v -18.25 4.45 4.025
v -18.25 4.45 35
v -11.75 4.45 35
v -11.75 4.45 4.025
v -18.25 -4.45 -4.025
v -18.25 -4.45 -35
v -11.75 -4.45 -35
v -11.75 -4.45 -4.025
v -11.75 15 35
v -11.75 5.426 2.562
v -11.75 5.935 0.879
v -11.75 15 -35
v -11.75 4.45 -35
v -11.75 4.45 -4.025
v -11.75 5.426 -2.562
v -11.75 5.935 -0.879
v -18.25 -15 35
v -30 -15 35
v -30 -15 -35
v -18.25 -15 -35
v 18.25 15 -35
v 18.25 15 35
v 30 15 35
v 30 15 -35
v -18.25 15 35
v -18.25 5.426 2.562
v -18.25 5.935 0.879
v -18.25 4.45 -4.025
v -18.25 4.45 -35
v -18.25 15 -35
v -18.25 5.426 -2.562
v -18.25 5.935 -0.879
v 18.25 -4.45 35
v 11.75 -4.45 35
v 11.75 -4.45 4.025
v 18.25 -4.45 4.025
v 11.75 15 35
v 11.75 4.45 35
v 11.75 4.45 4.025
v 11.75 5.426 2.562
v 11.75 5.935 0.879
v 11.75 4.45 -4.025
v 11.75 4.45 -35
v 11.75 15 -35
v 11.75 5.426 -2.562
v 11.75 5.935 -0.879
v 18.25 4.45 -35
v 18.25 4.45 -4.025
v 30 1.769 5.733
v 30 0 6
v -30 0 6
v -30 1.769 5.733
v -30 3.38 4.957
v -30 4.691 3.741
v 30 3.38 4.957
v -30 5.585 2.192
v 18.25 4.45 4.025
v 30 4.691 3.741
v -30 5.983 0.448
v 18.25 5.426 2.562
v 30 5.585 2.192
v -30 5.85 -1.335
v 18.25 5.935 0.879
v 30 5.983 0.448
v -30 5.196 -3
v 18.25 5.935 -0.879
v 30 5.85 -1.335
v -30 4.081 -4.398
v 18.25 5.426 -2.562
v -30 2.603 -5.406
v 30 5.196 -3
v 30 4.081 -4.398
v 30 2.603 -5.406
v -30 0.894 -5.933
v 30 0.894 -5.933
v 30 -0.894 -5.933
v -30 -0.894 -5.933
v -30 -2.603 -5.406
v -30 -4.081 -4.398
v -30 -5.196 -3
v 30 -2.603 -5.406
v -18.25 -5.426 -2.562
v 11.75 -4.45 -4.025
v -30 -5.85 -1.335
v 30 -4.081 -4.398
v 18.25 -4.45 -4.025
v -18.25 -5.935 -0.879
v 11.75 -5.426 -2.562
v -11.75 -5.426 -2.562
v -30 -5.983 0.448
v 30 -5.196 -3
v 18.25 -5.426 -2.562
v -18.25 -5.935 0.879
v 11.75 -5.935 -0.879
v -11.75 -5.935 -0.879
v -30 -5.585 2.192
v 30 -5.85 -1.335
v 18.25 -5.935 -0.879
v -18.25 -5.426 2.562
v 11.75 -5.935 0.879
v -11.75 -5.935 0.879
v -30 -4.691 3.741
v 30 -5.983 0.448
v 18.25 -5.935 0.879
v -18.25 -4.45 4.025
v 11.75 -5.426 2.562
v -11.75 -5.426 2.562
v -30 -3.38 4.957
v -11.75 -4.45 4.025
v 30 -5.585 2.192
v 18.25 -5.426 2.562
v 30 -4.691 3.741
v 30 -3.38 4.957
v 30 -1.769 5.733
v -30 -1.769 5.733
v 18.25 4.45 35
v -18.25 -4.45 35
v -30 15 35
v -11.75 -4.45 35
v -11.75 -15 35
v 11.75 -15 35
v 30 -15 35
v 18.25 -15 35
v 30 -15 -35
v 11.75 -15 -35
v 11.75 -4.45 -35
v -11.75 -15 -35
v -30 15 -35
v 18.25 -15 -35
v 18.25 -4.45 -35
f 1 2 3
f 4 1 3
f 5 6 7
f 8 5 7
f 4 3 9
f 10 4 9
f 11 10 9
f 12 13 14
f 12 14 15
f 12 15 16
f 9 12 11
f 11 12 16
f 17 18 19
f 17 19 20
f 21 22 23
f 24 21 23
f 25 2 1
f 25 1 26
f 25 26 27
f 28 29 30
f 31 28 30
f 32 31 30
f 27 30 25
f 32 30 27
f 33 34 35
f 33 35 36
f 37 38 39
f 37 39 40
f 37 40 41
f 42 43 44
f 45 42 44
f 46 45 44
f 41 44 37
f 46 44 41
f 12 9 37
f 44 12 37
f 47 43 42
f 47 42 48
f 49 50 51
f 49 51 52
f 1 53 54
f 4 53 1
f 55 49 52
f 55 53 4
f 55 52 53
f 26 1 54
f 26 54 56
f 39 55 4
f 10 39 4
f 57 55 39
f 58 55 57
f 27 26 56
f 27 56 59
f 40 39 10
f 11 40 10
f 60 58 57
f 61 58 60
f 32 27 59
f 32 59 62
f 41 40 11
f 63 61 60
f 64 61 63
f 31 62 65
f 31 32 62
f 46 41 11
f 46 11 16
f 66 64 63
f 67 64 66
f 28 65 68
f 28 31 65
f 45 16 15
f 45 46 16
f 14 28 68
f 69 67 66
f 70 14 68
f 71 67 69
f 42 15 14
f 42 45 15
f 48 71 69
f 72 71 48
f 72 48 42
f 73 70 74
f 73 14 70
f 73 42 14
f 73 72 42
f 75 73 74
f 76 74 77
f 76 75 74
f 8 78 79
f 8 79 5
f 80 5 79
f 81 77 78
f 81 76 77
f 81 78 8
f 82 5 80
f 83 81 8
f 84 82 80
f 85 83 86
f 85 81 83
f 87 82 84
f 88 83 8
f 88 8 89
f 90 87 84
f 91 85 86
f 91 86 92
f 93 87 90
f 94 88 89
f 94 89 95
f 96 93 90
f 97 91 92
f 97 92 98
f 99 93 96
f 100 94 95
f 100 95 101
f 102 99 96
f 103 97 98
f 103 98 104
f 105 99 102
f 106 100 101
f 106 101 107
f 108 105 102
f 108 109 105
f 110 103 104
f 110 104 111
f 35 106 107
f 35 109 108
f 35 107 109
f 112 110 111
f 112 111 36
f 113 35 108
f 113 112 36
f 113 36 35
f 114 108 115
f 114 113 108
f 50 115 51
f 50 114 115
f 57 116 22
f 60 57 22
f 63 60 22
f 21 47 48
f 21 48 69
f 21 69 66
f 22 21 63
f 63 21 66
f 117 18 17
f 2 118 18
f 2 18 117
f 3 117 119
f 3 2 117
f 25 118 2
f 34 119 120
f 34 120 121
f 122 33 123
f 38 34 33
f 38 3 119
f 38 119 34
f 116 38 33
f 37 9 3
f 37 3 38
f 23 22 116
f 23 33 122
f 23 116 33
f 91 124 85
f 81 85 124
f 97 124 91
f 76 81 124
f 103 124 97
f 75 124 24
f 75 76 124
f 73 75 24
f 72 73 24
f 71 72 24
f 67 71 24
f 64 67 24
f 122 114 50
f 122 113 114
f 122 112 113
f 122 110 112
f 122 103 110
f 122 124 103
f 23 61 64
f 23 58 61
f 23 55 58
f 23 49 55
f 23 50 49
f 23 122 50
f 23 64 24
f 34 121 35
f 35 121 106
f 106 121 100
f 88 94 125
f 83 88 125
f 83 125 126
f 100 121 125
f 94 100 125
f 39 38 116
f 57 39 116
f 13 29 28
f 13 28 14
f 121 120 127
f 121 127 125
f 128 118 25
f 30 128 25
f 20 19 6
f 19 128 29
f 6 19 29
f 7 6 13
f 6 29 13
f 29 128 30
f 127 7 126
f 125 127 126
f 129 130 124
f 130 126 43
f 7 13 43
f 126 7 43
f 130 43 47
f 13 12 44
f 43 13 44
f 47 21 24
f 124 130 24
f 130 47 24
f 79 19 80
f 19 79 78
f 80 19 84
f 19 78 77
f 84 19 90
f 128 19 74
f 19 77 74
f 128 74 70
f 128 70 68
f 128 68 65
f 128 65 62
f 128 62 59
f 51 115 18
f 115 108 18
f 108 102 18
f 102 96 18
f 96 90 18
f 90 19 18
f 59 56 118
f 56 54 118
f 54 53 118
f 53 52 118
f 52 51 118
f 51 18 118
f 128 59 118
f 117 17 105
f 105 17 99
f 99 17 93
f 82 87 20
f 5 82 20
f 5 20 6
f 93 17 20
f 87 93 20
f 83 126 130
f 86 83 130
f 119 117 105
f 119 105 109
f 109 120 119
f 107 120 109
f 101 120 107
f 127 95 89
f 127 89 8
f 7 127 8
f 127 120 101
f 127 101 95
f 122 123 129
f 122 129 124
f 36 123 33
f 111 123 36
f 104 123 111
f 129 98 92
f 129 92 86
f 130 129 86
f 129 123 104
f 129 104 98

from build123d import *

# Parameters (mm, degrees)
SKETCH1_W               = 60
SKETCH1_H               = 30
BOSS_EXTRUDE1_DEPTH     = 35
CUT_EXTRUDE1_DEPTH      = 49.476798574
CUT_EXTRUDE1_DEPTH_BACK = 49.476798574
SKETCH3_W               = 6.5
SKETCH3_H               = 10.55
CUT_EXTRUDE2_DEPTH      = 72.063352018
CUT_EXTRUDE2_DEPTH_BACK = 72.063352018
SKETCH4_R               = 6


with BuildPart() as part:
    # Sketch1 → Boss-Extrude1 (new, symmetric)
    with BuildSketch(Plane.XY):
        Rectangle(SKETCH1_W, SKETCH1_H)
    extrude(amount=BOSS_EXTRUDE1_DEPTH, both=True)

    # Sketch3 → Cut-Extrude1 (cut, two sides: drawn at the far end of the back side and taken through both)
    with BuildSketch(Plane.XY.offset(-CUT_EXTRUDE1_DEPTH_BACK)):
        with Locations((15, 9.725)):
            Rectangle(SKETCH3_W, SKETCH3_H)
        with Locations((-15, 9.725)):
            Rectangle(SKETCH3_W, SKETCH3_H)
        with Locations((-15, -9.725)):
            Rectangle(SKETCH3_W, SKETCH3_H)
        with Locations((15, -9.725)):
            Rectangle(SKETCH3_W, SKETCH3_H)
    extrude(amount=CUT_EXTRUDE1_DEPTH + CUT_EXTRUDE1_DEPTH_BACK, mode=Mode.SUBTRACT)

    # Sketch4 → Cut-Extrude2 (cut, two sides: drawn at the far end of the back side and taken through both)
    with BuildSketch(Plane.ZY.offset(30).offset(-CUT_EXTRUDE2_DEPTH_BACK)):
        Circle(SKETCH4_R)
    extrude(amount=CUT_EXTRUDE2_DEPTH + CUT_EXTRUDE2_DEPTH_BACK, mode=Mode.SUBTRACT)


solid = part.part
